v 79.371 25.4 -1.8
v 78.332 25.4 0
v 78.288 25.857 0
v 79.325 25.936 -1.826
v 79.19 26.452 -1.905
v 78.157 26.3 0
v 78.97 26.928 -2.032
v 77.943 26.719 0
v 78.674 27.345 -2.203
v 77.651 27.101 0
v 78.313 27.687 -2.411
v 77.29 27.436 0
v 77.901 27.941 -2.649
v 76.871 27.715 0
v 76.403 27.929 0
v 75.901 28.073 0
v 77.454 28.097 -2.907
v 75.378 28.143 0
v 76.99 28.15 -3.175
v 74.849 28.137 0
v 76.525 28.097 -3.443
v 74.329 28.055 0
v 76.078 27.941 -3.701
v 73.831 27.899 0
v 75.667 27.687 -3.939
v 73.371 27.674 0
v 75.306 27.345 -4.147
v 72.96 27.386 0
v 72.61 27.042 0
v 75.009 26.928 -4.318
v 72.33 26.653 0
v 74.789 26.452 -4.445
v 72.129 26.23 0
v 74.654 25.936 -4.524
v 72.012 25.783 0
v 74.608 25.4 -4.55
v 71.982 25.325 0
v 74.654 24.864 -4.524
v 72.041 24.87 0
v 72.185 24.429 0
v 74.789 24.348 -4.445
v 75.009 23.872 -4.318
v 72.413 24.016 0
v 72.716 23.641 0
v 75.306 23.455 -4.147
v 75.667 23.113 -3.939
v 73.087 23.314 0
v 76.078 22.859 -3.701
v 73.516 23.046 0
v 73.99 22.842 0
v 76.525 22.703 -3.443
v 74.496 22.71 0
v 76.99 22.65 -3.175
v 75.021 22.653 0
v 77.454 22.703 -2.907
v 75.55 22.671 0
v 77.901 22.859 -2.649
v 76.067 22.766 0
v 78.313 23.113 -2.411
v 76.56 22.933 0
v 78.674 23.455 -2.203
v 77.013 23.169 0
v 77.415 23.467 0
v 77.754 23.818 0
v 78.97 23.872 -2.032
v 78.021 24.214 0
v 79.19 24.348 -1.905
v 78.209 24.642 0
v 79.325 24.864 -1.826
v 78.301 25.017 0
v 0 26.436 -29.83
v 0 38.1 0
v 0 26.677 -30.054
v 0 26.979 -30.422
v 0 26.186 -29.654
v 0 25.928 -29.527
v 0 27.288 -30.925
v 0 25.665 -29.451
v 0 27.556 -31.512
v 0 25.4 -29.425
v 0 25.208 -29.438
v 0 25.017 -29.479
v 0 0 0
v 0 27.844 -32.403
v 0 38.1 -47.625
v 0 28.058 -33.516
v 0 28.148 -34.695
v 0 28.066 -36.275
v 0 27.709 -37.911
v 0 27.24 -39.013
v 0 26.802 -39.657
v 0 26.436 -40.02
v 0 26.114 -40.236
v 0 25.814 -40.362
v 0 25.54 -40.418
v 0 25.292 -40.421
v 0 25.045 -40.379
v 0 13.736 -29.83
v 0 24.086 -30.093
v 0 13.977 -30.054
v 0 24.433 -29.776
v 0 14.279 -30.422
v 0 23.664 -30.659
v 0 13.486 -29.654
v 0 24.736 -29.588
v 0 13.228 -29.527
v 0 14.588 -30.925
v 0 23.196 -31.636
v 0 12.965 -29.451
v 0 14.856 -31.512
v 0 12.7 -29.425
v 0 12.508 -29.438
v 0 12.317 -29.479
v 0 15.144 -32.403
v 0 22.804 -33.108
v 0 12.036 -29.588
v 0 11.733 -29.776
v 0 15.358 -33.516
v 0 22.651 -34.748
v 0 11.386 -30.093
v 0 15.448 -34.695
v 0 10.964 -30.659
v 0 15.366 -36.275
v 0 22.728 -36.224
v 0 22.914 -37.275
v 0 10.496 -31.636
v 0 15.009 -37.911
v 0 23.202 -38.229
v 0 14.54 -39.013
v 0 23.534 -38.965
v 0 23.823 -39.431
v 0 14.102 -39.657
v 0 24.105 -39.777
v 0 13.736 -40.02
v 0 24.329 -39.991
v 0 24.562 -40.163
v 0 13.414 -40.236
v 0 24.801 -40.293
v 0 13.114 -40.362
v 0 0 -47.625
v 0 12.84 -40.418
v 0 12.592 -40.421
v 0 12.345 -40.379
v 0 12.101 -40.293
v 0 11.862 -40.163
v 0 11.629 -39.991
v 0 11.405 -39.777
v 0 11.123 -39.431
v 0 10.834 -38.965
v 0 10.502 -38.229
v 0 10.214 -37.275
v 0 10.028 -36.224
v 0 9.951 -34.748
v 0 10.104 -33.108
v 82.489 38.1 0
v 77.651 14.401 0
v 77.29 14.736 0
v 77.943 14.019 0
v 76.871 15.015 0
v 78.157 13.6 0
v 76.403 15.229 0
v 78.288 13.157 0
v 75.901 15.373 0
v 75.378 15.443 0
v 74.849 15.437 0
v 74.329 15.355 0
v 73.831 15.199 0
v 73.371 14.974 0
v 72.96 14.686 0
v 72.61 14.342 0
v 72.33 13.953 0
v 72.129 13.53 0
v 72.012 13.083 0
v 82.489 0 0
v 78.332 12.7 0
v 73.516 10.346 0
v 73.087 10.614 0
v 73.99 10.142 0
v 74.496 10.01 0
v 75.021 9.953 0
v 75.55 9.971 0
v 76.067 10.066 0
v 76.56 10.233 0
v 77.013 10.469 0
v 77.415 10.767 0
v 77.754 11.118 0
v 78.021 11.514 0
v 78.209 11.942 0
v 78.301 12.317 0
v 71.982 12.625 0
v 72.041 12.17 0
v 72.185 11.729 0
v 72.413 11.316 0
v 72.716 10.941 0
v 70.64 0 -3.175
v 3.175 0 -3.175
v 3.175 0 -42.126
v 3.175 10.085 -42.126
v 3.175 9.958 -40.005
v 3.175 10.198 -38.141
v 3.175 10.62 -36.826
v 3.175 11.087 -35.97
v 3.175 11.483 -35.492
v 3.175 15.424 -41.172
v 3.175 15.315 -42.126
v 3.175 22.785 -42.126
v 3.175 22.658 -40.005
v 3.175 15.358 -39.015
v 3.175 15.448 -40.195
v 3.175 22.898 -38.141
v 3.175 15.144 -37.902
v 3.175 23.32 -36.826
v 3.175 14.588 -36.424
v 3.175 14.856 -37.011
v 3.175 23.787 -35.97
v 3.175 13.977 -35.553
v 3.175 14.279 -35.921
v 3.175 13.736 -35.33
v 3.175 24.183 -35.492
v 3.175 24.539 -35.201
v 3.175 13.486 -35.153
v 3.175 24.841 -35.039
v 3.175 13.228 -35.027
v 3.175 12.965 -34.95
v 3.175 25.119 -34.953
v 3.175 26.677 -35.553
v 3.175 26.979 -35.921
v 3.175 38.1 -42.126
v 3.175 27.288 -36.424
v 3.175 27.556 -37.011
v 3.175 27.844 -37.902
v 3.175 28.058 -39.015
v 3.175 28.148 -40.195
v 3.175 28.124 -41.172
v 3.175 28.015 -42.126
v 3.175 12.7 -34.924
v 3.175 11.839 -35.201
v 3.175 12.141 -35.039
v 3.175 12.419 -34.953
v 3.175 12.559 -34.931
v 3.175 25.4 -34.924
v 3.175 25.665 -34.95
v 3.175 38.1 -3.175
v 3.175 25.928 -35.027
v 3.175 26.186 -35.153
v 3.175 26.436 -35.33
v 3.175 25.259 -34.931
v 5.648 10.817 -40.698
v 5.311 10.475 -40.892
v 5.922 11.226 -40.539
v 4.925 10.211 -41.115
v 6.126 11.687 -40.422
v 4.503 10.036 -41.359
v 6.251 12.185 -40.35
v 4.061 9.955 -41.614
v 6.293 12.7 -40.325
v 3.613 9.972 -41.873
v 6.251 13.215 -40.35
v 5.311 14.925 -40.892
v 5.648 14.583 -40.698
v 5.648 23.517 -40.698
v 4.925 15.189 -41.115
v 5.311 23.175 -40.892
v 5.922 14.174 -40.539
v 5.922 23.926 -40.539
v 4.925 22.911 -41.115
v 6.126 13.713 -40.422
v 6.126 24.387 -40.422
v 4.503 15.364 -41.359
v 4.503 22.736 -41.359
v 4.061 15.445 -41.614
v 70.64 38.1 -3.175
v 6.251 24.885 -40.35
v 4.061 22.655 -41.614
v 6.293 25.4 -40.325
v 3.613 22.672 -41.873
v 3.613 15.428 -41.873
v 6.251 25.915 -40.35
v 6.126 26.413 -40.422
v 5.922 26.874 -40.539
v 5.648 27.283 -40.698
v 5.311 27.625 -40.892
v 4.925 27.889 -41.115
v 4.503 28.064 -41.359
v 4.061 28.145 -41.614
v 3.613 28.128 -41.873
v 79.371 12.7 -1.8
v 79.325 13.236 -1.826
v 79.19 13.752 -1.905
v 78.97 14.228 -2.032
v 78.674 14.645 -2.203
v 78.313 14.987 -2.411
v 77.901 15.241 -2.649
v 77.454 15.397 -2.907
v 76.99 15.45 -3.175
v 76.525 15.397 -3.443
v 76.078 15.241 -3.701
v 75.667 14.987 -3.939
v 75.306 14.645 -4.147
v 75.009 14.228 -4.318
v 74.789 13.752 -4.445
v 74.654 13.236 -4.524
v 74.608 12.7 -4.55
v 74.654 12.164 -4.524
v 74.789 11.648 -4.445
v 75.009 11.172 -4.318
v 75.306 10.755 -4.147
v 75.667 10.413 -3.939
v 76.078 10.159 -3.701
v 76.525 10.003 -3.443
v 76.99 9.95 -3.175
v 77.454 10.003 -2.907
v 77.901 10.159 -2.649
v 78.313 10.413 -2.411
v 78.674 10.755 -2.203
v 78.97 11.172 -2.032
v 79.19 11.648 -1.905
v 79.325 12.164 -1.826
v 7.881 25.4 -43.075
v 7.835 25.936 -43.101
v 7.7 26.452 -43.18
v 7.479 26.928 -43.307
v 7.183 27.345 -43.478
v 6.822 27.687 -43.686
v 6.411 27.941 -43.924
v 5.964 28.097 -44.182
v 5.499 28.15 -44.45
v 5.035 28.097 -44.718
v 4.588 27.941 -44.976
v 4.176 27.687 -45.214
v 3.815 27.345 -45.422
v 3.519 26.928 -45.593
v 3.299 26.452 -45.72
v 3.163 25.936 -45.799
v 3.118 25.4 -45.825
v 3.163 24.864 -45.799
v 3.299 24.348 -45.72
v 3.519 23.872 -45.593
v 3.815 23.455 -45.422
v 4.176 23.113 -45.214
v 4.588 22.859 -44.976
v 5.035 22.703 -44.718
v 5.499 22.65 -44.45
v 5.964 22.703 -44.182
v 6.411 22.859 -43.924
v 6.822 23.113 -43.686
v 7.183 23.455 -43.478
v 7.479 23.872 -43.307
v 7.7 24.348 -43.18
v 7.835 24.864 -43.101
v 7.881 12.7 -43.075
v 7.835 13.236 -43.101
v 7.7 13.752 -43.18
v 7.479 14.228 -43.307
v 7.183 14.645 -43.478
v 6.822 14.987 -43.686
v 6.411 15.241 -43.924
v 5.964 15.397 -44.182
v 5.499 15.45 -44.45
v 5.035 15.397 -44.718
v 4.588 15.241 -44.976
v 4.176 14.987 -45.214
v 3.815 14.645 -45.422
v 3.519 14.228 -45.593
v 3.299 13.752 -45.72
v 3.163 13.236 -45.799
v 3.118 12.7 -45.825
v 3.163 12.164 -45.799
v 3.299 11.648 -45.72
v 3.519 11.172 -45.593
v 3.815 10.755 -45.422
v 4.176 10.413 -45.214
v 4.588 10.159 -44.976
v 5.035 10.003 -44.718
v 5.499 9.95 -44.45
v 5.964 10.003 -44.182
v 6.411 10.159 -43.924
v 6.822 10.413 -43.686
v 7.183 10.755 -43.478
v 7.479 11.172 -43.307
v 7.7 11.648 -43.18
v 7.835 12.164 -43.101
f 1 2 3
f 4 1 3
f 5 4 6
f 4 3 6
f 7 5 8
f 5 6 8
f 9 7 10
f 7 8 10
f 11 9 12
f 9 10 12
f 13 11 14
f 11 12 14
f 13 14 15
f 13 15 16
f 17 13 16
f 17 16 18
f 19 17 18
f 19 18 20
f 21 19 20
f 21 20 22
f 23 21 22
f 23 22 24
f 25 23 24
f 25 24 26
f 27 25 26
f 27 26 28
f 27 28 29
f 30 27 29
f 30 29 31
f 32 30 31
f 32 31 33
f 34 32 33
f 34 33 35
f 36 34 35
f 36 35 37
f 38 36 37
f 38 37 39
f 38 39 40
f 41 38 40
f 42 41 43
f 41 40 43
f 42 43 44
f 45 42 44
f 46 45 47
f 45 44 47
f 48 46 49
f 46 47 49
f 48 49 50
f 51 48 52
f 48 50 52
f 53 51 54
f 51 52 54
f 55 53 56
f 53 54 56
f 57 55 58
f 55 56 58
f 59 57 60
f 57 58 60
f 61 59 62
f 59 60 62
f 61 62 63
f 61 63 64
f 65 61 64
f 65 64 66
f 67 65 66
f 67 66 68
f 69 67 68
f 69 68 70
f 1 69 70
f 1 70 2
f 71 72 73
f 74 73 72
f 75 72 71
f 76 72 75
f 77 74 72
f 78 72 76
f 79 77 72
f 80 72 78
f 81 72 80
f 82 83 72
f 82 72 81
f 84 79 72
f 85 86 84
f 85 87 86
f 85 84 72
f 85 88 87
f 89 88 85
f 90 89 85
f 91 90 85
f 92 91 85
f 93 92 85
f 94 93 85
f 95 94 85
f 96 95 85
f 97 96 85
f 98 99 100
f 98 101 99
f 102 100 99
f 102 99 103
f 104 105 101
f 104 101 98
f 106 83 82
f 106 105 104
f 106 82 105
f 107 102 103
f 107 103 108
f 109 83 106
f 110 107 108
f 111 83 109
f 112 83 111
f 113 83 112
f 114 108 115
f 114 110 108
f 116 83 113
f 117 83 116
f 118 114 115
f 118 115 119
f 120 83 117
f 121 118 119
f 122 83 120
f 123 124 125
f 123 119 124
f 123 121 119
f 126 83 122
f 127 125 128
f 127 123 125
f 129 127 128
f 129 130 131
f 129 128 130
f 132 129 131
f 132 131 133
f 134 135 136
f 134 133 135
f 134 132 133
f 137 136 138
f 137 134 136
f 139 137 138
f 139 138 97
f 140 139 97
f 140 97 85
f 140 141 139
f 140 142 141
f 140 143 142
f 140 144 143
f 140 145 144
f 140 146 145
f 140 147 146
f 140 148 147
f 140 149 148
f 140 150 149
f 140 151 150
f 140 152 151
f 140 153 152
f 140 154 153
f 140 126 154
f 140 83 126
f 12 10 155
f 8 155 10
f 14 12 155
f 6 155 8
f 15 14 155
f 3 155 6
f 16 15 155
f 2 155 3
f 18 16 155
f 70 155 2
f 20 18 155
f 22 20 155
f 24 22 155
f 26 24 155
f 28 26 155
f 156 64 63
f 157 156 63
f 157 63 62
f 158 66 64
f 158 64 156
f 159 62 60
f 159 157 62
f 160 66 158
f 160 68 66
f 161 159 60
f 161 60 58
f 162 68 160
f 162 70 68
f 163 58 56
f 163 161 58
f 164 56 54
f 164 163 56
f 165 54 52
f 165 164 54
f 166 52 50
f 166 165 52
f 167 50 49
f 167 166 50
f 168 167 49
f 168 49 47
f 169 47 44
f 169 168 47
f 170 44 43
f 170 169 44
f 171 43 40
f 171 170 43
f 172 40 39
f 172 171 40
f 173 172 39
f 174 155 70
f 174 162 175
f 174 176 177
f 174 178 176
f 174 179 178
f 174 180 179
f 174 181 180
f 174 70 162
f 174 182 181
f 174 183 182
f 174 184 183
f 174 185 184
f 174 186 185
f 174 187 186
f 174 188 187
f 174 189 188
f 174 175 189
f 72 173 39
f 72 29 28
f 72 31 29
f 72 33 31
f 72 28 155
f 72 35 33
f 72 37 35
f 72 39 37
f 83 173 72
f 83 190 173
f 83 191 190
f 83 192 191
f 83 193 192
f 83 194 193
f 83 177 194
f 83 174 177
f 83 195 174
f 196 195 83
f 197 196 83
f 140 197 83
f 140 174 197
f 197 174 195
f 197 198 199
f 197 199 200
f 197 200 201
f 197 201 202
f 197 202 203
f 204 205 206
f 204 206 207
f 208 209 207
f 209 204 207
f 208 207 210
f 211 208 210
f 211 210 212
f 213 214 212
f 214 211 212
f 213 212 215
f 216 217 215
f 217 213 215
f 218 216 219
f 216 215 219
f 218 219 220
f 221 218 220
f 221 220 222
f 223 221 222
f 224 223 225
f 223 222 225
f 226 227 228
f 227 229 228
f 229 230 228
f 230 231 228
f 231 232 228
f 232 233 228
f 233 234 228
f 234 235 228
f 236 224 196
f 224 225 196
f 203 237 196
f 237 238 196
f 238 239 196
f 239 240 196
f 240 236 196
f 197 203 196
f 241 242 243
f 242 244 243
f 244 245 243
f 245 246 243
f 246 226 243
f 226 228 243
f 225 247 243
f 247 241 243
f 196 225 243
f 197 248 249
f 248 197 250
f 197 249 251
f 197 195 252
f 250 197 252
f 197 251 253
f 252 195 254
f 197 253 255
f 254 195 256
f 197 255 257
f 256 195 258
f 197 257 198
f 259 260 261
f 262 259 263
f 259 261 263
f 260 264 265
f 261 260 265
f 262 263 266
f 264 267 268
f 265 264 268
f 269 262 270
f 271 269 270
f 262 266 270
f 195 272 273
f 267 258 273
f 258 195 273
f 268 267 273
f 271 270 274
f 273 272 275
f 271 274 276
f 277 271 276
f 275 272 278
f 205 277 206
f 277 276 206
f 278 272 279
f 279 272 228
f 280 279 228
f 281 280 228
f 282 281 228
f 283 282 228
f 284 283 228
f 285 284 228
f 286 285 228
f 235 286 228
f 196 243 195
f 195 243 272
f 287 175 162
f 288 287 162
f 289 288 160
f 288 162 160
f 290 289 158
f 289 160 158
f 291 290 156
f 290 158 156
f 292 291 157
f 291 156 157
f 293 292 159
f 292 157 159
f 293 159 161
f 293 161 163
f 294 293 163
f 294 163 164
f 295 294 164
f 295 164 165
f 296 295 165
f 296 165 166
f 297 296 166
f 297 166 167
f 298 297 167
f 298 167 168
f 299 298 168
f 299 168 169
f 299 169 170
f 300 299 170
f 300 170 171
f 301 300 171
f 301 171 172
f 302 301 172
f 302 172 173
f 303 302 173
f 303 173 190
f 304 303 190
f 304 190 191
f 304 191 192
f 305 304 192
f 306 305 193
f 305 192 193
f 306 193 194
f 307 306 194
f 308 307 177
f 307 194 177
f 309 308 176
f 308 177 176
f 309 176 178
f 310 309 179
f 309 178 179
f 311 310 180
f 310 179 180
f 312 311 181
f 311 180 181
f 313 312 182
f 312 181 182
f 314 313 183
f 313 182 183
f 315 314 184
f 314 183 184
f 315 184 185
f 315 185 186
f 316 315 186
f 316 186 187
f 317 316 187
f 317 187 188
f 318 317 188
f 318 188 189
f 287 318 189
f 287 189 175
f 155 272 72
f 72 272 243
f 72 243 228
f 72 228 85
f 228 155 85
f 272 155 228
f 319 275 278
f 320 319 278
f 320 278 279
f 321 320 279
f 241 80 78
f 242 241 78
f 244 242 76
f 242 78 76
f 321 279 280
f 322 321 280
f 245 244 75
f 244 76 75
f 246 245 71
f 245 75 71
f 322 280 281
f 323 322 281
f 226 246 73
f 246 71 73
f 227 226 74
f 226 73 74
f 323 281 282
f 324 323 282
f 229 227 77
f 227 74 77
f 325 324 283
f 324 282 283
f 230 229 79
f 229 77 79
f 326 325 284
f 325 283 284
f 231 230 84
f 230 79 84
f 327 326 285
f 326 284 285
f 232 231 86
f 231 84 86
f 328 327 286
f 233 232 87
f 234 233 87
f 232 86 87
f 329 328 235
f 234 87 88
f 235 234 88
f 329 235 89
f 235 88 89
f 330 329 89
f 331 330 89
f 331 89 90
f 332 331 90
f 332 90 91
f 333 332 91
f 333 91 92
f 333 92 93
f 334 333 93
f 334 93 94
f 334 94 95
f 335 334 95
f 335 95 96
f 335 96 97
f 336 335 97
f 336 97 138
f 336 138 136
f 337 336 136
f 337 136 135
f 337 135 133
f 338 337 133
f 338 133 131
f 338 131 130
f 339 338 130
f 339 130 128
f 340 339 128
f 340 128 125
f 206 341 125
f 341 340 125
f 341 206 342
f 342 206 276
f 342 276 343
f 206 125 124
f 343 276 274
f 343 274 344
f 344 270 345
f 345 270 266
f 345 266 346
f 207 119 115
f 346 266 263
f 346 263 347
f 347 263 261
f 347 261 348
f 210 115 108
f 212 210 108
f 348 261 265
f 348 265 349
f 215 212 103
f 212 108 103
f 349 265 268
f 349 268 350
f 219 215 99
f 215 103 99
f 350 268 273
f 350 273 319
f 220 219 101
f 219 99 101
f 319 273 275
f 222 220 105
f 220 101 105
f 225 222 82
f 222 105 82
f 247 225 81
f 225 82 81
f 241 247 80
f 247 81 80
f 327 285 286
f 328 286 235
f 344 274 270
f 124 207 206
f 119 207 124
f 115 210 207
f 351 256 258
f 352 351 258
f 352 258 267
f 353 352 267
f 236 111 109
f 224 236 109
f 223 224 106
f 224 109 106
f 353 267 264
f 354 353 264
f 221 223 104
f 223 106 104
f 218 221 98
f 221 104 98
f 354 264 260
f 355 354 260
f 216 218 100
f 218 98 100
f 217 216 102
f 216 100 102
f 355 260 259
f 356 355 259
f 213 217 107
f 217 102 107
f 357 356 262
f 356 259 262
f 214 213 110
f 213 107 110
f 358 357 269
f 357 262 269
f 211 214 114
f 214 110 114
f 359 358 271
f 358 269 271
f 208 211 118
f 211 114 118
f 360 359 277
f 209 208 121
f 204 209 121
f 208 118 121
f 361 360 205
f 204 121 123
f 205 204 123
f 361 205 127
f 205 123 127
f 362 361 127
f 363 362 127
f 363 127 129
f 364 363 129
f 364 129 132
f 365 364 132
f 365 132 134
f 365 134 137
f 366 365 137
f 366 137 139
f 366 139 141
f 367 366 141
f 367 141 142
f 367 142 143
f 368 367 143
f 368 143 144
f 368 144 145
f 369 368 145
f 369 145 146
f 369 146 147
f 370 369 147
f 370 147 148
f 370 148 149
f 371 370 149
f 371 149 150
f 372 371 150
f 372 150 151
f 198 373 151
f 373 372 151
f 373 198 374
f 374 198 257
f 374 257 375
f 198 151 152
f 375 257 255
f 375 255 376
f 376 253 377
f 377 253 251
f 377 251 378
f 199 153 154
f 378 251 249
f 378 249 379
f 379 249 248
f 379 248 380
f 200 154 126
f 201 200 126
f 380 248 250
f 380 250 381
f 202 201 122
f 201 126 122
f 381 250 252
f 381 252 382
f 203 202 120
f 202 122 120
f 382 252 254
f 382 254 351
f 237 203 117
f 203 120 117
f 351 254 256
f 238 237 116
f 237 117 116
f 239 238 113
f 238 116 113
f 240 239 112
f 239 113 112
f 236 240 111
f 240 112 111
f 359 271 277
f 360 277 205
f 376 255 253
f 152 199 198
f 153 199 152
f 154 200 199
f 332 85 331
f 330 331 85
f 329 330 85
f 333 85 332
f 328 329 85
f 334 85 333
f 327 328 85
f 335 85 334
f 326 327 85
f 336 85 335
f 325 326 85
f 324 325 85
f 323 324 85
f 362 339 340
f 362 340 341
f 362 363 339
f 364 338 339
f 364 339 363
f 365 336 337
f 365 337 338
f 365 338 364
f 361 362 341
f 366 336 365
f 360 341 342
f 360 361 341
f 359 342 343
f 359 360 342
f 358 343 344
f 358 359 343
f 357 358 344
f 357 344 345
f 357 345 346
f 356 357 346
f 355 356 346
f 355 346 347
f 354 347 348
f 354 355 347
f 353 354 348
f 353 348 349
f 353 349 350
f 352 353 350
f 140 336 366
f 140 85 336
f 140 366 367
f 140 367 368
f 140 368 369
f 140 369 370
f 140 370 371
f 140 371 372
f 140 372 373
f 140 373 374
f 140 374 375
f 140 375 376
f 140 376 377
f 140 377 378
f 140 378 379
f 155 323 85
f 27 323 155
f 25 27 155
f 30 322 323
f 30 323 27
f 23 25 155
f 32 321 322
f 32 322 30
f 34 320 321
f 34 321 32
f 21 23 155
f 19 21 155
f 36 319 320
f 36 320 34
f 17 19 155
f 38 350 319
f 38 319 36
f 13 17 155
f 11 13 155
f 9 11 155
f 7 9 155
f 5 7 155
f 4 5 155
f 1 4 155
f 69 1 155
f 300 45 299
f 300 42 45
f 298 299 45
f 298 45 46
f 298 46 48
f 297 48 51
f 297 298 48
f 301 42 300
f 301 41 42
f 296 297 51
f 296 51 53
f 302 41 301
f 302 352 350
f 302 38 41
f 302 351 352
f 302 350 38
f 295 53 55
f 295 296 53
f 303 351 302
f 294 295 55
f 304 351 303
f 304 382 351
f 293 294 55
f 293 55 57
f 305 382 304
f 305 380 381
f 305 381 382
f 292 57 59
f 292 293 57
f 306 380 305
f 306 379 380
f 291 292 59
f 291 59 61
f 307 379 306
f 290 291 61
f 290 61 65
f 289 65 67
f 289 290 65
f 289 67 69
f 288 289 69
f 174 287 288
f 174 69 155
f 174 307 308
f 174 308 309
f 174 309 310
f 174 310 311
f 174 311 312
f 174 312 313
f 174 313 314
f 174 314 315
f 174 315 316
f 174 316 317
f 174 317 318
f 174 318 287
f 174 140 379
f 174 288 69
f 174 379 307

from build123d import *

# Parameters (mm, degrees)
BOSS_EXTRUDE1_DEPTH  = 38.1
CUT_EXTRUDE1_DEPTH   = 103.587389576
M5_CLEARANCE_HOLE1_D = 5.5


with BuildPart() as part:
    # Sketch1 → Boss-Extrude1 (new body)
    with BuildSketch(Plane(origin=(0, 0, 0), x_dir=(1, 0, 0), z_dir=(0, 1, 0))):
        Polygon((0, 0), (0, 47.625), (82.48891971, 0), align=None)
    extrude(amount=BOSS_EXTRUDE1_DEPTH)

    # Sketch2 → Cut-Extrude1 (cut, through all)
    with BuildSketch(Plane(origin=(0, 38.1, 0), x_dir=(1, 0, 0), z_dir=(0, 1, 0))):
        Polygon((3.175, 3.175), (70.639658396, 3.175), (3.175, 42.125738686), align=None)
    extrude(amount=-CUT_EXTRUDE1_DEPTH, mode=Mode.SUBTRACT)

    # M5 Clearance Hole1 (through all)
    with Locations(Plane(origin=(20.622229928, 0, -35.71875), x_dir=(-0.8660254037844417, 0, -0.4999999999999947), z_dir=(0.4999999999999947, 0, -0.8660254037844417))):
        with Locations((17.4625, 12.7), (-65.0875, 12.7), (-65.0875, 25.4), (17.4625, 25.4)):
            Hole(M5_CLEARANCE_HOLE1_D / 2)


solid = part.part
